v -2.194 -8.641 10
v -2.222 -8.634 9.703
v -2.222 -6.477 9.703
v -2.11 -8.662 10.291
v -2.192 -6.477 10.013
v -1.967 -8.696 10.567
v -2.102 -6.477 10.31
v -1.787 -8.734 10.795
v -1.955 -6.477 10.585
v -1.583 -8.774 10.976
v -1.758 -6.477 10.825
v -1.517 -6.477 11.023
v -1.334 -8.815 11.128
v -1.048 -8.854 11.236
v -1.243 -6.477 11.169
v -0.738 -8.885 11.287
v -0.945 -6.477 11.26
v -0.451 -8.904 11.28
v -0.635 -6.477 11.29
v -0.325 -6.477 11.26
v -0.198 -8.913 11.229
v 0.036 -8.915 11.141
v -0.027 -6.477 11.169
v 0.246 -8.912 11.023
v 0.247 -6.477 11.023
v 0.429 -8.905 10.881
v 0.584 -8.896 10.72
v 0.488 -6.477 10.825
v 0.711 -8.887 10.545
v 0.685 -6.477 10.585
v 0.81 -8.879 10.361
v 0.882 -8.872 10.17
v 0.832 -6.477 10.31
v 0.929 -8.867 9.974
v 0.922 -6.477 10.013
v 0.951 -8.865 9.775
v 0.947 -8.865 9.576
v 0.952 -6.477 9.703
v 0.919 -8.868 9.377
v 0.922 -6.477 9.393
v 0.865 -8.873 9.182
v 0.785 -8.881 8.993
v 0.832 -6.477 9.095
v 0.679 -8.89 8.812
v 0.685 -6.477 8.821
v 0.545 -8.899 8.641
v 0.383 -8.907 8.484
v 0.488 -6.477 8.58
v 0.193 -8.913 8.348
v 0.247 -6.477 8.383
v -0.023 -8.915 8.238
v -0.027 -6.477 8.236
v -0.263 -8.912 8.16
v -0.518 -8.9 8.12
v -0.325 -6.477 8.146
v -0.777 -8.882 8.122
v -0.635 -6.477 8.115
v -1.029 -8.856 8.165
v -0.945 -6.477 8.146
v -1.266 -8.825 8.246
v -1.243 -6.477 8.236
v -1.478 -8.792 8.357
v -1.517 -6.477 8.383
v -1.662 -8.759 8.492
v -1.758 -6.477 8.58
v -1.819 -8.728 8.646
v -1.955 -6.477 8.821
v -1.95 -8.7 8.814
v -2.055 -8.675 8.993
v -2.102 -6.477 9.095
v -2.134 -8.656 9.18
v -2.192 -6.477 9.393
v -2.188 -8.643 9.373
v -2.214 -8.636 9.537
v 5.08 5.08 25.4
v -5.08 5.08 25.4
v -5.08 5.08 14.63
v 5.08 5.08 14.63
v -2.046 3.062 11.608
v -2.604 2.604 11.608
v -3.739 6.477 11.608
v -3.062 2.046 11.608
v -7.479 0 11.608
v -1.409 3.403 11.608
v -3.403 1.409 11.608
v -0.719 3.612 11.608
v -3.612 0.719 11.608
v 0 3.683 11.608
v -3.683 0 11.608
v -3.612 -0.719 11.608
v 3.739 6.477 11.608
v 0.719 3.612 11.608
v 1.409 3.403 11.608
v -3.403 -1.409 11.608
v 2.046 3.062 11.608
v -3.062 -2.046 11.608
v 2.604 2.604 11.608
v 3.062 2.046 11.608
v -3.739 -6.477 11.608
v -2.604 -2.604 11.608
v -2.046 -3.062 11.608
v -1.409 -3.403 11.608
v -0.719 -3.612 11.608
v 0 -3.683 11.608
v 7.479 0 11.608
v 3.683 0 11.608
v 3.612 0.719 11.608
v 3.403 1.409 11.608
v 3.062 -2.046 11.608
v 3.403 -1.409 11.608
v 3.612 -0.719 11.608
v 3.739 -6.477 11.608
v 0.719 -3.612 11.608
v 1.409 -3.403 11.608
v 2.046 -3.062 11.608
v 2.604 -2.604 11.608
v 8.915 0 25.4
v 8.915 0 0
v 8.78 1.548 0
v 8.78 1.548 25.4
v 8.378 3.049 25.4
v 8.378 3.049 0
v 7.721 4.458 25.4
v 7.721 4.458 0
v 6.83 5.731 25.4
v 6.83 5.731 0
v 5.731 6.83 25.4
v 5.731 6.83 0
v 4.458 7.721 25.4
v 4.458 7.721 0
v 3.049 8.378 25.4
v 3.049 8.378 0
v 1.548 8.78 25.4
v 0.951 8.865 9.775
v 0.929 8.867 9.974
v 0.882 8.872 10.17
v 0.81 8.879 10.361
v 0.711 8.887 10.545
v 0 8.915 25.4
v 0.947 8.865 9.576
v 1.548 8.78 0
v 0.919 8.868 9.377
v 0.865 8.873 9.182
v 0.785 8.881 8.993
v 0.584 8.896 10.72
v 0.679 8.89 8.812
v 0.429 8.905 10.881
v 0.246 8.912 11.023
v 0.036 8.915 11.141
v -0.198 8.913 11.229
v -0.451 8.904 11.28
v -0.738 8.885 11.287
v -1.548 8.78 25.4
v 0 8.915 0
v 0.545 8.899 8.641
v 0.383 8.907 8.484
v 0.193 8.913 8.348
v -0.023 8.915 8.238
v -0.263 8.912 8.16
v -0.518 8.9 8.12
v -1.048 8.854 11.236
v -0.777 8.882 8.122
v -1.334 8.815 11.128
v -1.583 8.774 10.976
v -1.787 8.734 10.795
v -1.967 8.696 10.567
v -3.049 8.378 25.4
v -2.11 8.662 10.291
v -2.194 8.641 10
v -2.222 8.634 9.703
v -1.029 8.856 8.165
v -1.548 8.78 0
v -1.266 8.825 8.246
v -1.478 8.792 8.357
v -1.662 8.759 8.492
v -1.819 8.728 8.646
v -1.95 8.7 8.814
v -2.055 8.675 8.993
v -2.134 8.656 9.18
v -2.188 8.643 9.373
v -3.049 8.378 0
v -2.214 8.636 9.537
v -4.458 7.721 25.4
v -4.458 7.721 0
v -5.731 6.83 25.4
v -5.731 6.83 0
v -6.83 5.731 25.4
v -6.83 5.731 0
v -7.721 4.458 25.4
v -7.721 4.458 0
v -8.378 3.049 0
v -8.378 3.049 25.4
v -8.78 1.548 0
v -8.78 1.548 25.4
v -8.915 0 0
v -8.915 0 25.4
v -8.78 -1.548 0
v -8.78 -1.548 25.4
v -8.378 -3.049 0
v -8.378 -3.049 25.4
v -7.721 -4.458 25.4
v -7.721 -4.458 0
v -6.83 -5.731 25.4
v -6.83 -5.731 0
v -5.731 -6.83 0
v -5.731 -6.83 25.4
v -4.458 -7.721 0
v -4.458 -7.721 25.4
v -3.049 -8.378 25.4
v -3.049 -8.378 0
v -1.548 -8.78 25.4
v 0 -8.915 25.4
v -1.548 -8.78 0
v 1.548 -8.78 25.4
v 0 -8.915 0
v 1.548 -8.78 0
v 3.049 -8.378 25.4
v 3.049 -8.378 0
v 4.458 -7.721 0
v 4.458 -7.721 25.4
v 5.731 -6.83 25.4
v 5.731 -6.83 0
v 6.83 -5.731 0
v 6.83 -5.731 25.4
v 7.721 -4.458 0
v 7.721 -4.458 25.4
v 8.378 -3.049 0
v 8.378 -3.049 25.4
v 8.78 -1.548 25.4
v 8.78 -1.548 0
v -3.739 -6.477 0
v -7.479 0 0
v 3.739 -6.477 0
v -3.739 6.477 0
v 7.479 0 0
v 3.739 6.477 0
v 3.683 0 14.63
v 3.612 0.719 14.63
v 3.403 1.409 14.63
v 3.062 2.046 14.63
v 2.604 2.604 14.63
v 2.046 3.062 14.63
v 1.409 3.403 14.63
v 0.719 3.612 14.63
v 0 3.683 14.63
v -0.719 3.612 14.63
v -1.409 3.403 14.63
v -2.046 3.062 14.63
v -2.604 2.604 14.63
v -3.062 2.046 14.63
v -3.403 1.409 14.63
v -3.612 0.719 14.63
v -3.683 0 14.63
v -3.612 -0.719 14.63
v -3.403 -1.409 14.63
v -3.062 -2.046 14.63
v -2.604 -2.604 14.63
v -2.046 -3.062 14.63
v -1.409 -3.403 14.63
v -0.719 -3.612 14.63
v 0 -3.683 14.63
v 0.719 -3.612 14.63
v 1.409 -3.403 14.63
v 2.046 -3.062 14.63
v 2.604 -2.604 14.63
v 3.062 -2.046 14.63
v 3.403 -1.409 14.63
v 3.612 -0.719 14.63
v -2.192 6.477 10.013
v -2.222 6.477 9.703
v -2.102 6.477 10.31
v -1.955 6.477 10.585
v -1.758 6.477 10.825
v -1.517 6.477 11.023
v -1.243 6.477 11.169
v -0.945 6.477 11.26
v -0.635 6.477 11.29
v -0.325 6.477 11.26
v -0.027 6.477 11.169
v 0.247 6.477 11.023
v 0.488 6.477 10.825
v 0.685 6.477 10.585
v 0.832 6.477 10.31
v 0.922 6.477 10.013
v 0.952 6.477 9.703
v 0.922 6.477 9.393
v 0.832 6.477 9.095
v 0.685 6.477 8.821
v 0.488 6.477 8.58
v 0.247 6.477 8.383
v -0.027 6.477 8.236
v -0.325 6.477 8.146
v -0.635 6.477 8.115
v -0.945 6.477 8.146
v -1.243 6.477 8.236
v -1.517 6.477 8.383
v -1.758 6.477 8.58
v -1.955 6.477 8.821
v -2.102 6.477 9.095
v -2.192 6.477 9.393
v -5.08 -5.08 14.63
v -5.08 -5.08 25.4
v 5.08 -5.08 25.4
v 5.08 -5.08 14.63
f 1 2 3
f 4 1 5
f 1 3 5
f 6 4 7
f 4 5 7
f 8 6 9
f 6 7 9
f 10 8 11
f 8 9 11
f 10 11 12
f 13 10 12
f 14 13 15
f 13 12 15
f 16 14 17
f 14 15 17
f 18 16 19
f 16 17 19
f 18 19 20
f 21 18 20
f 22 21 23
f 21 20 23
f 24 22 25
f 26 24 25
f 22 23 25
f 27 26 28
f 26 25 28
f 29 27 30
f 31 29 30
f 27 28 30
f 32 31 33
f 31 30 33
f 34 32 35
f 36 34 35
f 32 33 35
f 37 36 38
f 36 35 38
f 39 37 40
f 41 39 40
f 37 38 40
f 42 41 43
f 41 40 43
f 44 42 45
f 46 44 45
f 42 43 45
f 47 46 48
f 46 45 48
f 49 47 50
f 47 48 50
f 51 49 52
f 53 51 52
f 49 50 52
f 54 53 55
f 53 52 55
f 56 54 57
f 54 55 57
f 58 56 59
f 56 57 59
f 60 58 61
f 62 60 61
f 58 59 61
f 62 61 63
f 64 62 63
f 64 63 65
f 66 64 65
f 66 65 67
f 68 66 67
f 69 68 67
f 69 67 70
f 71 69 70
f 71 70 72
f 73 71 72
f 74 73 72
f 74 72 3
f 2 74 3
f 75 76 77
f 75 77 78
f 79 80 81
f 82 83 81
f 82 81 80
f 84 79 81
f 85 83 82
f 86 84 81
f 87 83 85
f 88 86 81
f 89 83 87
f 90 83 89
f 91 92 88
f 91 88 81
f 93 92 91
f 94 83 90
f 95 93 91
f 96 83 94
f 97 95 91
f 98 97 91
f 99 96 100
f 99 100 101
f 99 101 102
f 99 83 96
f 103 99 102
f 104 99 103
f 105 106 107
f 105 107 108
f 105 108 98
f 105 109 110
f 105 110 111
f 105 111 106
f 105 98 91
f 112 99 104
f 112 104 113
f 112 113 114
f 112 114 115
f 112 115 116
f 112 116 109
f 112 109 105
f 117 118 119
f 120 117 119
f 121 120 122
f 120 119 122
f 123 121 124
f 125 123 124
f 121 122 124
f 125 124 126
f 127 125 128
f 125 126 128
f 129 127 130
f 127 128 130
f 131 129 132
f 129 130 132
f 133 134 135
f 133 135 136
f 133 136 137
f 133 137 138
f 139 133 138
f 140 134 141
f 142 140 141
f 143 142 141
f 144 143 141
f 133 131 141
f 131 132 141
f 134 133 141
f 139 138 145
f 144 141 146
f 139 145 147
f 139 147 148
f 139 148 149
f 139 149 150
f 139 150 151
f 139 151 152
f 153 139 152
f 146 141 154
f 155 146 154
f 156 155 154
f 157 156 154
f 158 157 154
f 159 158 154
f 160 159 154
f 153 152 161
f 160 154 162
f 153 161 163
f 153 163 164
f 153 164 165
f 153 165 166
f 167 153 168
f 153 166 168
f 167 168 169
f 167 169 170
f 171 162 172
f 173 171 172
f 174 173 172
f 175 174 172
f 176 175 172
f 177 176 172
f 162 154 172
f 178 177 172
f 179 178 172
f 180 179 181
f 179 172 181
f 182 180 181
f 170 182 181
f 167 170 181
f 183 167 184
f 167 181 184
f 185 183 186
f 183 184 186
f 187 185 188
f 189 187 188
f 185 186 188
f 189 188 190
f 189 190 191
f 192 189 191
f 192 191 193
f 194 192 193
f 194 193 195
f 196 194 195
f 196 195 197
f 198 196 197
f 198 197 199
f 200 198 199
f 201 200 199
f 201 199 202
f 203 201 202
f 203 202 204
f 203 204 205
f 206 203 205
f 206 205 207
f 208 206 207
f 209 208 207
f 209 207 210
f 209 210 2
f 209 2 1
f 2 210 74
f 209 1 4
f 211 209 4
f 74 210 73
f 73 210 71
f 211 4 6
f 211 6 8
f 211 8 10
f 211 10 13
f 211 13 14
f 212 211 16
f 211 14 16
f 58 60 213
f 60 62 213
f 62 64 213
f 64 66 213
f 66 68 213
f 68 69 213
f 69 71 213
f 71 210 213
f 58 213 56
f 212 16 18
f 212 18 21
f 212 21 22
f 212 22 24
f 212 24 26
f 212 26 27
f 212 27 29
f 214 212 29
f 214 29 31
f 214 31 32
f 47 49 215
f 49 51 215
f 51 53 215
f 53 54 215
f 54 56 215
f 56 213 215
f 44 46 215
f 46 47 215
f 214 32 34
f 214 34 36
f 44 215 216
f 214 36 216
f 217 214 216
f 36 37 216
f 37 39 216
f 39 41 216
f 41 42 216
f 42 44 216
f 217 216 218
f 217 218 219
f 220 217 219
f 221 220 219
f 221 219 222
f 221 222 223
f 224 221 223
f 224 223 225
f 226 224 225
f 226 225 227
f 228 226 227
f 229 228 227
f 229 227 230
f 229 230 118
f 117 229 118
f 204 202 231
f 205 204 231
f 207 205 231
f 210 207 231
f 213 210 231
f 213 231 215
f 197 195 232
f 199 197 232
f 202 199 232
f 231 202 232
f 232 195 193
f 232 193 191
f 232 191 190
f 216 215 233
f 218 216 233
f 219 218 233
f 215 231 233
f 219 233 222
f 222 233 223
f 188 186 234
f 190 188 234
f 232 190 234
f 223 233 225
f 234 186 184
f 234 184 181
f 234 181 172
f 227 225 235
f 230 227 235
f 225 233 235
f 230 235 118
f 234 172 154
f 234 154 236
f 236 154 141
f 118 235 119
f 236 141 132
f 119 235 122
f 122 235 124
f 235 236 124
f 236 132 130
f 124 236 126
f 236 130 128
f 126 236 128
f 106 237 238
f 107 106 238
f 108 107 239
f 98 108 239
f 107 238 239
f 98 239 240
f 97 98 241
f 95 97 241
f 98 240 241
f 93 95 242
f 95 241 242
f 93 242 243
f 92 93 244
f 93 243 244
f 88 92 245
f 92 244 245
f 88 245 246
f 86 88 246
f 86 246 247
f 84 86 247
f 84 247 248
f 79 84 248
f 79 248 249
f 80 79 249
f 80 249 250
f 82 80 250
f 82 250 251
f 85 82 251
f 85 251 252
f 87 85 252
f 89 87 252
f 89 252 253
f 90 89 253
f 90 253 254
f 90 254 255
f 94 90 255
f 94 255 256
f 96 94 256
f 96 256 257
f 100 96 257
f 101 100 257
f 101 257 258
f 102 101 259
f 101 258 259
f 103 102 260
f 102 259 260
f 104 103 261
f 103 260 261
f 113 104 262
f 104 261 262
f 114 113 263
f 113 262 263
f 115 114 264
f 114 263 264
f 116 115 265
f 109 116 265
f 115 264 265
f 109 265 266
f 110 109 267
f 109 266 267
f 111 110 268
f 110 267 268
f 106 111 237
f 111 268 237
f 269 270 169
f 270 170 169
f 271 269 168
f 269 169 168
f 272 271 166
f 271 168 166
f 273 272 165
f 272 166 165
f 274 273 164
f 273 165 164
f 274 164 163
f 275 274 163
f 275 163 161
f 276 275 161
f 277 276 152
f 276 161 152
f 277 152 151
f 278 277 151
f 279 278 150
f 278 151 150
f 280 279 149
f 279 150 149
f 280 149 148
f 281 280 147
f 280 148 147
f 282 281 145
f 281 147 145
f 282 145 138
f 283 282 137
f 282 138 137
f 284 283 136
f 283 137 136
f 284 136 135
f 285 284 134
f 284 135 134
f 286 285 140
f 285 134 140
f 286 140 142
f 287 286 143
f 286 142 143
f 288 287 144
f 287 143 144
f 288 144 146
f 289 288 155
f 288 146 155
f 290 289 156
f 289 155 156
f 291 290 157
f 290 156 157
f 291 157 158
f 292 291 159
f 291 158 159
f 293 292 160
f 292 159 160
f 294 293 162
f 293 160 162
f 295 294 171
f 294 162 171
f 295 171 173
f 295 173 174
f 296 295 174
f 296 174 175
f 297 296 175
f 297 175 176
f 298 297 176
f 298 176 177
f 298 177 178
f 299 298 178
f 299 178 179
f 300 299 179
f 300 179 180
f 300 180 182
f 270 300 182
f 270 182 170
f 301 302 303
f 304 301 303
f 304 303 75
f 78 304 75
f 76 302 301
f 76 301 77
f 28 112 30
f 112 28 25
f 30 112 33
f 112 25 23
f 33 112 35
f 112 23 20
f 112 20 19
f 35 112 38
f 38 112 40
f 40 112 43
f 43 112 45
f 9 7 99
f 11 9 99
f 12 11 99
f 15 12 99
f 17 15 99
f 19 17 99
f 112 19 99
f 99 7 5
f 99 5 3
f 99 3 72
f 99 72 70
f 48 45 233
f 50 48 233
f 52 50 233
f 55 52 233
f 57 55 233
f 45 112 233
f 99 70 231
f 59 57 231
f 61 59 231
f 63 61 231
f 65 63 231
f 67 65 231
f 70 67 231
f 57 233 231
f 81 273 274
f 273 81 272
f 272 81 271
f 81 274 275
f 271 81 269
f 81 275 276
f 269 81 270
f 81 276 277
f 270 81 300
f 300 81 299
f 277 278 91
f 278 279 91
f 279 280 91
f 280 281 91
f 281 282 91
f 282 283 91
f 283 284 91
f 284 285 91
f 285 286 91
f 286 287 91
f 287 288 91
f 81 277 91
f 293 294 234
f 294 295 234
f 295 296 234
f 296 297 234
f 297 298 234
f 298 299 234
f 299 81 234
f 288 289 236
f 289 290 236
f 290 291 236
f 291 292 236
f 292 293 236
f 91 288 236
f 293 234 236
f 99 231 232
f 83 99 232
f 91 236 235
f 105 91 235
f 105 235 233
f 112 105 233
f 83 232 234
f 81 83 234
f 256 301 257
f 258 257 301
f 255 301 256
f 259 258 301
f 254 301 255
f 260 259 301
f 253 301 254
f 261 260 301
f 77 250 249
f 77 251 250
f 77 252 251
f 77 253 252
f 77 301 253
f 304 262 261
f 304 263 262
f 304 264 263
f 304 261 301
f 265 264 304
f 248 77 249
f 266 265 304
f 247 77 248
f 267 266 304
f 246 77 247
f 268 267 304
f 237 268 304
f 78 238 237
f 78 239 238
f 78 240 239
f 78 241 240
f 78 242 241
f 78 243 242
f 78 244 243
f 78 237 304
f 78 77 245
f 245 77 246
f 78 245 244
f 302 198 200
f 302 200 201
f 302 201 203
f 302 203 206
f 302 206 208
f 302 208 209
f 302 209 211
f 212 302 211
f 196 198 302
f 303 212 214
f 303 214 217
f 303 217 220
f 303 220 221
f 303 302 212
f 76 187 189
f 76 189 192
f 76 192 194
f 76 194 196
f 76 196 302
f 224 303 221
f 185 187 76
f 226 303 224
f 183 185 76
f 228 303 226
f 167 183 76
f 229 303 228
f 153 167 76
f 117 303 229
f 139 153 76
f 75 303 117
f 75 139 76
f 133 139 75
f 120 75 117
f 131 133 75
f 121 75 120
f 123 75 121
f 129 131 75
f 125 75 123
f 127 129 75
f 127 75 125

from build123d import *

# Parameters (mm, degrees)
F0_R     = 8.9154
F1_DEPTH = 25.4
F2_W     = 10.16
F2_H     = 10.16
F3_DEPTH = 10.7696
F4_R     = 3.683
F5_DEPTH = 14.6314
F7_DEPTH = 11.6078
F8_R     = 1.5875
F9_DEPTH = 25.4


with BuildPart() as f1:
    # F0 (on Top) → F1 (new body)
    with BuildSketch(Plane.XY):
        Circle(F0_R)
    extrude(amount=F1_DEPTH)

    # F2 (on face) → F3 (cut)
    with BuildSketch(Plane.XY.offset(25.4)):
        Rectangle(F2_W, F2_H)
    extrude(amount=-F3_DEPTH, mode=Mode.SUBTRACT)

    # F4 (on face) → F5 (cut, through all)
    with BuildSketch(Plane.XY.offset(14.6304)):
        Circle(F4_R)
    extrude(amount=-F5_DEPTH, mode=Mode.SUBTRACT)

    # F6 (on face) → F7 (cut)
    with BuildSketch(Plane(origin=(0, 0, 0), x_dir=(1, 0, 0), z_dir=(0, 0, -1))):
        Polygon((3.739498, 6.477), (-3.739498, 6.477), (-7.478995, 0), (-3.739498, -6.477), (3.739498, -6.477), (7.478995, 0), align=None)
    extrude(amount=-F7_DEPTH, mode=Mode.SUBTRACT)

    # F8 (on face) → F9 (cut, symmetric)
    with BuildSketch(Plane(origin=(0, -6.477, 0), x_dir=(-1, 0, 0), z_dir=(0, 1, 0))):
        with Locations((0.635, 9.7028)):
            Circle(F8_R)
    extrude(amount=F9_DEPTH, both=True, mode=Mode.SUBTRACT)


solid = f1.part
